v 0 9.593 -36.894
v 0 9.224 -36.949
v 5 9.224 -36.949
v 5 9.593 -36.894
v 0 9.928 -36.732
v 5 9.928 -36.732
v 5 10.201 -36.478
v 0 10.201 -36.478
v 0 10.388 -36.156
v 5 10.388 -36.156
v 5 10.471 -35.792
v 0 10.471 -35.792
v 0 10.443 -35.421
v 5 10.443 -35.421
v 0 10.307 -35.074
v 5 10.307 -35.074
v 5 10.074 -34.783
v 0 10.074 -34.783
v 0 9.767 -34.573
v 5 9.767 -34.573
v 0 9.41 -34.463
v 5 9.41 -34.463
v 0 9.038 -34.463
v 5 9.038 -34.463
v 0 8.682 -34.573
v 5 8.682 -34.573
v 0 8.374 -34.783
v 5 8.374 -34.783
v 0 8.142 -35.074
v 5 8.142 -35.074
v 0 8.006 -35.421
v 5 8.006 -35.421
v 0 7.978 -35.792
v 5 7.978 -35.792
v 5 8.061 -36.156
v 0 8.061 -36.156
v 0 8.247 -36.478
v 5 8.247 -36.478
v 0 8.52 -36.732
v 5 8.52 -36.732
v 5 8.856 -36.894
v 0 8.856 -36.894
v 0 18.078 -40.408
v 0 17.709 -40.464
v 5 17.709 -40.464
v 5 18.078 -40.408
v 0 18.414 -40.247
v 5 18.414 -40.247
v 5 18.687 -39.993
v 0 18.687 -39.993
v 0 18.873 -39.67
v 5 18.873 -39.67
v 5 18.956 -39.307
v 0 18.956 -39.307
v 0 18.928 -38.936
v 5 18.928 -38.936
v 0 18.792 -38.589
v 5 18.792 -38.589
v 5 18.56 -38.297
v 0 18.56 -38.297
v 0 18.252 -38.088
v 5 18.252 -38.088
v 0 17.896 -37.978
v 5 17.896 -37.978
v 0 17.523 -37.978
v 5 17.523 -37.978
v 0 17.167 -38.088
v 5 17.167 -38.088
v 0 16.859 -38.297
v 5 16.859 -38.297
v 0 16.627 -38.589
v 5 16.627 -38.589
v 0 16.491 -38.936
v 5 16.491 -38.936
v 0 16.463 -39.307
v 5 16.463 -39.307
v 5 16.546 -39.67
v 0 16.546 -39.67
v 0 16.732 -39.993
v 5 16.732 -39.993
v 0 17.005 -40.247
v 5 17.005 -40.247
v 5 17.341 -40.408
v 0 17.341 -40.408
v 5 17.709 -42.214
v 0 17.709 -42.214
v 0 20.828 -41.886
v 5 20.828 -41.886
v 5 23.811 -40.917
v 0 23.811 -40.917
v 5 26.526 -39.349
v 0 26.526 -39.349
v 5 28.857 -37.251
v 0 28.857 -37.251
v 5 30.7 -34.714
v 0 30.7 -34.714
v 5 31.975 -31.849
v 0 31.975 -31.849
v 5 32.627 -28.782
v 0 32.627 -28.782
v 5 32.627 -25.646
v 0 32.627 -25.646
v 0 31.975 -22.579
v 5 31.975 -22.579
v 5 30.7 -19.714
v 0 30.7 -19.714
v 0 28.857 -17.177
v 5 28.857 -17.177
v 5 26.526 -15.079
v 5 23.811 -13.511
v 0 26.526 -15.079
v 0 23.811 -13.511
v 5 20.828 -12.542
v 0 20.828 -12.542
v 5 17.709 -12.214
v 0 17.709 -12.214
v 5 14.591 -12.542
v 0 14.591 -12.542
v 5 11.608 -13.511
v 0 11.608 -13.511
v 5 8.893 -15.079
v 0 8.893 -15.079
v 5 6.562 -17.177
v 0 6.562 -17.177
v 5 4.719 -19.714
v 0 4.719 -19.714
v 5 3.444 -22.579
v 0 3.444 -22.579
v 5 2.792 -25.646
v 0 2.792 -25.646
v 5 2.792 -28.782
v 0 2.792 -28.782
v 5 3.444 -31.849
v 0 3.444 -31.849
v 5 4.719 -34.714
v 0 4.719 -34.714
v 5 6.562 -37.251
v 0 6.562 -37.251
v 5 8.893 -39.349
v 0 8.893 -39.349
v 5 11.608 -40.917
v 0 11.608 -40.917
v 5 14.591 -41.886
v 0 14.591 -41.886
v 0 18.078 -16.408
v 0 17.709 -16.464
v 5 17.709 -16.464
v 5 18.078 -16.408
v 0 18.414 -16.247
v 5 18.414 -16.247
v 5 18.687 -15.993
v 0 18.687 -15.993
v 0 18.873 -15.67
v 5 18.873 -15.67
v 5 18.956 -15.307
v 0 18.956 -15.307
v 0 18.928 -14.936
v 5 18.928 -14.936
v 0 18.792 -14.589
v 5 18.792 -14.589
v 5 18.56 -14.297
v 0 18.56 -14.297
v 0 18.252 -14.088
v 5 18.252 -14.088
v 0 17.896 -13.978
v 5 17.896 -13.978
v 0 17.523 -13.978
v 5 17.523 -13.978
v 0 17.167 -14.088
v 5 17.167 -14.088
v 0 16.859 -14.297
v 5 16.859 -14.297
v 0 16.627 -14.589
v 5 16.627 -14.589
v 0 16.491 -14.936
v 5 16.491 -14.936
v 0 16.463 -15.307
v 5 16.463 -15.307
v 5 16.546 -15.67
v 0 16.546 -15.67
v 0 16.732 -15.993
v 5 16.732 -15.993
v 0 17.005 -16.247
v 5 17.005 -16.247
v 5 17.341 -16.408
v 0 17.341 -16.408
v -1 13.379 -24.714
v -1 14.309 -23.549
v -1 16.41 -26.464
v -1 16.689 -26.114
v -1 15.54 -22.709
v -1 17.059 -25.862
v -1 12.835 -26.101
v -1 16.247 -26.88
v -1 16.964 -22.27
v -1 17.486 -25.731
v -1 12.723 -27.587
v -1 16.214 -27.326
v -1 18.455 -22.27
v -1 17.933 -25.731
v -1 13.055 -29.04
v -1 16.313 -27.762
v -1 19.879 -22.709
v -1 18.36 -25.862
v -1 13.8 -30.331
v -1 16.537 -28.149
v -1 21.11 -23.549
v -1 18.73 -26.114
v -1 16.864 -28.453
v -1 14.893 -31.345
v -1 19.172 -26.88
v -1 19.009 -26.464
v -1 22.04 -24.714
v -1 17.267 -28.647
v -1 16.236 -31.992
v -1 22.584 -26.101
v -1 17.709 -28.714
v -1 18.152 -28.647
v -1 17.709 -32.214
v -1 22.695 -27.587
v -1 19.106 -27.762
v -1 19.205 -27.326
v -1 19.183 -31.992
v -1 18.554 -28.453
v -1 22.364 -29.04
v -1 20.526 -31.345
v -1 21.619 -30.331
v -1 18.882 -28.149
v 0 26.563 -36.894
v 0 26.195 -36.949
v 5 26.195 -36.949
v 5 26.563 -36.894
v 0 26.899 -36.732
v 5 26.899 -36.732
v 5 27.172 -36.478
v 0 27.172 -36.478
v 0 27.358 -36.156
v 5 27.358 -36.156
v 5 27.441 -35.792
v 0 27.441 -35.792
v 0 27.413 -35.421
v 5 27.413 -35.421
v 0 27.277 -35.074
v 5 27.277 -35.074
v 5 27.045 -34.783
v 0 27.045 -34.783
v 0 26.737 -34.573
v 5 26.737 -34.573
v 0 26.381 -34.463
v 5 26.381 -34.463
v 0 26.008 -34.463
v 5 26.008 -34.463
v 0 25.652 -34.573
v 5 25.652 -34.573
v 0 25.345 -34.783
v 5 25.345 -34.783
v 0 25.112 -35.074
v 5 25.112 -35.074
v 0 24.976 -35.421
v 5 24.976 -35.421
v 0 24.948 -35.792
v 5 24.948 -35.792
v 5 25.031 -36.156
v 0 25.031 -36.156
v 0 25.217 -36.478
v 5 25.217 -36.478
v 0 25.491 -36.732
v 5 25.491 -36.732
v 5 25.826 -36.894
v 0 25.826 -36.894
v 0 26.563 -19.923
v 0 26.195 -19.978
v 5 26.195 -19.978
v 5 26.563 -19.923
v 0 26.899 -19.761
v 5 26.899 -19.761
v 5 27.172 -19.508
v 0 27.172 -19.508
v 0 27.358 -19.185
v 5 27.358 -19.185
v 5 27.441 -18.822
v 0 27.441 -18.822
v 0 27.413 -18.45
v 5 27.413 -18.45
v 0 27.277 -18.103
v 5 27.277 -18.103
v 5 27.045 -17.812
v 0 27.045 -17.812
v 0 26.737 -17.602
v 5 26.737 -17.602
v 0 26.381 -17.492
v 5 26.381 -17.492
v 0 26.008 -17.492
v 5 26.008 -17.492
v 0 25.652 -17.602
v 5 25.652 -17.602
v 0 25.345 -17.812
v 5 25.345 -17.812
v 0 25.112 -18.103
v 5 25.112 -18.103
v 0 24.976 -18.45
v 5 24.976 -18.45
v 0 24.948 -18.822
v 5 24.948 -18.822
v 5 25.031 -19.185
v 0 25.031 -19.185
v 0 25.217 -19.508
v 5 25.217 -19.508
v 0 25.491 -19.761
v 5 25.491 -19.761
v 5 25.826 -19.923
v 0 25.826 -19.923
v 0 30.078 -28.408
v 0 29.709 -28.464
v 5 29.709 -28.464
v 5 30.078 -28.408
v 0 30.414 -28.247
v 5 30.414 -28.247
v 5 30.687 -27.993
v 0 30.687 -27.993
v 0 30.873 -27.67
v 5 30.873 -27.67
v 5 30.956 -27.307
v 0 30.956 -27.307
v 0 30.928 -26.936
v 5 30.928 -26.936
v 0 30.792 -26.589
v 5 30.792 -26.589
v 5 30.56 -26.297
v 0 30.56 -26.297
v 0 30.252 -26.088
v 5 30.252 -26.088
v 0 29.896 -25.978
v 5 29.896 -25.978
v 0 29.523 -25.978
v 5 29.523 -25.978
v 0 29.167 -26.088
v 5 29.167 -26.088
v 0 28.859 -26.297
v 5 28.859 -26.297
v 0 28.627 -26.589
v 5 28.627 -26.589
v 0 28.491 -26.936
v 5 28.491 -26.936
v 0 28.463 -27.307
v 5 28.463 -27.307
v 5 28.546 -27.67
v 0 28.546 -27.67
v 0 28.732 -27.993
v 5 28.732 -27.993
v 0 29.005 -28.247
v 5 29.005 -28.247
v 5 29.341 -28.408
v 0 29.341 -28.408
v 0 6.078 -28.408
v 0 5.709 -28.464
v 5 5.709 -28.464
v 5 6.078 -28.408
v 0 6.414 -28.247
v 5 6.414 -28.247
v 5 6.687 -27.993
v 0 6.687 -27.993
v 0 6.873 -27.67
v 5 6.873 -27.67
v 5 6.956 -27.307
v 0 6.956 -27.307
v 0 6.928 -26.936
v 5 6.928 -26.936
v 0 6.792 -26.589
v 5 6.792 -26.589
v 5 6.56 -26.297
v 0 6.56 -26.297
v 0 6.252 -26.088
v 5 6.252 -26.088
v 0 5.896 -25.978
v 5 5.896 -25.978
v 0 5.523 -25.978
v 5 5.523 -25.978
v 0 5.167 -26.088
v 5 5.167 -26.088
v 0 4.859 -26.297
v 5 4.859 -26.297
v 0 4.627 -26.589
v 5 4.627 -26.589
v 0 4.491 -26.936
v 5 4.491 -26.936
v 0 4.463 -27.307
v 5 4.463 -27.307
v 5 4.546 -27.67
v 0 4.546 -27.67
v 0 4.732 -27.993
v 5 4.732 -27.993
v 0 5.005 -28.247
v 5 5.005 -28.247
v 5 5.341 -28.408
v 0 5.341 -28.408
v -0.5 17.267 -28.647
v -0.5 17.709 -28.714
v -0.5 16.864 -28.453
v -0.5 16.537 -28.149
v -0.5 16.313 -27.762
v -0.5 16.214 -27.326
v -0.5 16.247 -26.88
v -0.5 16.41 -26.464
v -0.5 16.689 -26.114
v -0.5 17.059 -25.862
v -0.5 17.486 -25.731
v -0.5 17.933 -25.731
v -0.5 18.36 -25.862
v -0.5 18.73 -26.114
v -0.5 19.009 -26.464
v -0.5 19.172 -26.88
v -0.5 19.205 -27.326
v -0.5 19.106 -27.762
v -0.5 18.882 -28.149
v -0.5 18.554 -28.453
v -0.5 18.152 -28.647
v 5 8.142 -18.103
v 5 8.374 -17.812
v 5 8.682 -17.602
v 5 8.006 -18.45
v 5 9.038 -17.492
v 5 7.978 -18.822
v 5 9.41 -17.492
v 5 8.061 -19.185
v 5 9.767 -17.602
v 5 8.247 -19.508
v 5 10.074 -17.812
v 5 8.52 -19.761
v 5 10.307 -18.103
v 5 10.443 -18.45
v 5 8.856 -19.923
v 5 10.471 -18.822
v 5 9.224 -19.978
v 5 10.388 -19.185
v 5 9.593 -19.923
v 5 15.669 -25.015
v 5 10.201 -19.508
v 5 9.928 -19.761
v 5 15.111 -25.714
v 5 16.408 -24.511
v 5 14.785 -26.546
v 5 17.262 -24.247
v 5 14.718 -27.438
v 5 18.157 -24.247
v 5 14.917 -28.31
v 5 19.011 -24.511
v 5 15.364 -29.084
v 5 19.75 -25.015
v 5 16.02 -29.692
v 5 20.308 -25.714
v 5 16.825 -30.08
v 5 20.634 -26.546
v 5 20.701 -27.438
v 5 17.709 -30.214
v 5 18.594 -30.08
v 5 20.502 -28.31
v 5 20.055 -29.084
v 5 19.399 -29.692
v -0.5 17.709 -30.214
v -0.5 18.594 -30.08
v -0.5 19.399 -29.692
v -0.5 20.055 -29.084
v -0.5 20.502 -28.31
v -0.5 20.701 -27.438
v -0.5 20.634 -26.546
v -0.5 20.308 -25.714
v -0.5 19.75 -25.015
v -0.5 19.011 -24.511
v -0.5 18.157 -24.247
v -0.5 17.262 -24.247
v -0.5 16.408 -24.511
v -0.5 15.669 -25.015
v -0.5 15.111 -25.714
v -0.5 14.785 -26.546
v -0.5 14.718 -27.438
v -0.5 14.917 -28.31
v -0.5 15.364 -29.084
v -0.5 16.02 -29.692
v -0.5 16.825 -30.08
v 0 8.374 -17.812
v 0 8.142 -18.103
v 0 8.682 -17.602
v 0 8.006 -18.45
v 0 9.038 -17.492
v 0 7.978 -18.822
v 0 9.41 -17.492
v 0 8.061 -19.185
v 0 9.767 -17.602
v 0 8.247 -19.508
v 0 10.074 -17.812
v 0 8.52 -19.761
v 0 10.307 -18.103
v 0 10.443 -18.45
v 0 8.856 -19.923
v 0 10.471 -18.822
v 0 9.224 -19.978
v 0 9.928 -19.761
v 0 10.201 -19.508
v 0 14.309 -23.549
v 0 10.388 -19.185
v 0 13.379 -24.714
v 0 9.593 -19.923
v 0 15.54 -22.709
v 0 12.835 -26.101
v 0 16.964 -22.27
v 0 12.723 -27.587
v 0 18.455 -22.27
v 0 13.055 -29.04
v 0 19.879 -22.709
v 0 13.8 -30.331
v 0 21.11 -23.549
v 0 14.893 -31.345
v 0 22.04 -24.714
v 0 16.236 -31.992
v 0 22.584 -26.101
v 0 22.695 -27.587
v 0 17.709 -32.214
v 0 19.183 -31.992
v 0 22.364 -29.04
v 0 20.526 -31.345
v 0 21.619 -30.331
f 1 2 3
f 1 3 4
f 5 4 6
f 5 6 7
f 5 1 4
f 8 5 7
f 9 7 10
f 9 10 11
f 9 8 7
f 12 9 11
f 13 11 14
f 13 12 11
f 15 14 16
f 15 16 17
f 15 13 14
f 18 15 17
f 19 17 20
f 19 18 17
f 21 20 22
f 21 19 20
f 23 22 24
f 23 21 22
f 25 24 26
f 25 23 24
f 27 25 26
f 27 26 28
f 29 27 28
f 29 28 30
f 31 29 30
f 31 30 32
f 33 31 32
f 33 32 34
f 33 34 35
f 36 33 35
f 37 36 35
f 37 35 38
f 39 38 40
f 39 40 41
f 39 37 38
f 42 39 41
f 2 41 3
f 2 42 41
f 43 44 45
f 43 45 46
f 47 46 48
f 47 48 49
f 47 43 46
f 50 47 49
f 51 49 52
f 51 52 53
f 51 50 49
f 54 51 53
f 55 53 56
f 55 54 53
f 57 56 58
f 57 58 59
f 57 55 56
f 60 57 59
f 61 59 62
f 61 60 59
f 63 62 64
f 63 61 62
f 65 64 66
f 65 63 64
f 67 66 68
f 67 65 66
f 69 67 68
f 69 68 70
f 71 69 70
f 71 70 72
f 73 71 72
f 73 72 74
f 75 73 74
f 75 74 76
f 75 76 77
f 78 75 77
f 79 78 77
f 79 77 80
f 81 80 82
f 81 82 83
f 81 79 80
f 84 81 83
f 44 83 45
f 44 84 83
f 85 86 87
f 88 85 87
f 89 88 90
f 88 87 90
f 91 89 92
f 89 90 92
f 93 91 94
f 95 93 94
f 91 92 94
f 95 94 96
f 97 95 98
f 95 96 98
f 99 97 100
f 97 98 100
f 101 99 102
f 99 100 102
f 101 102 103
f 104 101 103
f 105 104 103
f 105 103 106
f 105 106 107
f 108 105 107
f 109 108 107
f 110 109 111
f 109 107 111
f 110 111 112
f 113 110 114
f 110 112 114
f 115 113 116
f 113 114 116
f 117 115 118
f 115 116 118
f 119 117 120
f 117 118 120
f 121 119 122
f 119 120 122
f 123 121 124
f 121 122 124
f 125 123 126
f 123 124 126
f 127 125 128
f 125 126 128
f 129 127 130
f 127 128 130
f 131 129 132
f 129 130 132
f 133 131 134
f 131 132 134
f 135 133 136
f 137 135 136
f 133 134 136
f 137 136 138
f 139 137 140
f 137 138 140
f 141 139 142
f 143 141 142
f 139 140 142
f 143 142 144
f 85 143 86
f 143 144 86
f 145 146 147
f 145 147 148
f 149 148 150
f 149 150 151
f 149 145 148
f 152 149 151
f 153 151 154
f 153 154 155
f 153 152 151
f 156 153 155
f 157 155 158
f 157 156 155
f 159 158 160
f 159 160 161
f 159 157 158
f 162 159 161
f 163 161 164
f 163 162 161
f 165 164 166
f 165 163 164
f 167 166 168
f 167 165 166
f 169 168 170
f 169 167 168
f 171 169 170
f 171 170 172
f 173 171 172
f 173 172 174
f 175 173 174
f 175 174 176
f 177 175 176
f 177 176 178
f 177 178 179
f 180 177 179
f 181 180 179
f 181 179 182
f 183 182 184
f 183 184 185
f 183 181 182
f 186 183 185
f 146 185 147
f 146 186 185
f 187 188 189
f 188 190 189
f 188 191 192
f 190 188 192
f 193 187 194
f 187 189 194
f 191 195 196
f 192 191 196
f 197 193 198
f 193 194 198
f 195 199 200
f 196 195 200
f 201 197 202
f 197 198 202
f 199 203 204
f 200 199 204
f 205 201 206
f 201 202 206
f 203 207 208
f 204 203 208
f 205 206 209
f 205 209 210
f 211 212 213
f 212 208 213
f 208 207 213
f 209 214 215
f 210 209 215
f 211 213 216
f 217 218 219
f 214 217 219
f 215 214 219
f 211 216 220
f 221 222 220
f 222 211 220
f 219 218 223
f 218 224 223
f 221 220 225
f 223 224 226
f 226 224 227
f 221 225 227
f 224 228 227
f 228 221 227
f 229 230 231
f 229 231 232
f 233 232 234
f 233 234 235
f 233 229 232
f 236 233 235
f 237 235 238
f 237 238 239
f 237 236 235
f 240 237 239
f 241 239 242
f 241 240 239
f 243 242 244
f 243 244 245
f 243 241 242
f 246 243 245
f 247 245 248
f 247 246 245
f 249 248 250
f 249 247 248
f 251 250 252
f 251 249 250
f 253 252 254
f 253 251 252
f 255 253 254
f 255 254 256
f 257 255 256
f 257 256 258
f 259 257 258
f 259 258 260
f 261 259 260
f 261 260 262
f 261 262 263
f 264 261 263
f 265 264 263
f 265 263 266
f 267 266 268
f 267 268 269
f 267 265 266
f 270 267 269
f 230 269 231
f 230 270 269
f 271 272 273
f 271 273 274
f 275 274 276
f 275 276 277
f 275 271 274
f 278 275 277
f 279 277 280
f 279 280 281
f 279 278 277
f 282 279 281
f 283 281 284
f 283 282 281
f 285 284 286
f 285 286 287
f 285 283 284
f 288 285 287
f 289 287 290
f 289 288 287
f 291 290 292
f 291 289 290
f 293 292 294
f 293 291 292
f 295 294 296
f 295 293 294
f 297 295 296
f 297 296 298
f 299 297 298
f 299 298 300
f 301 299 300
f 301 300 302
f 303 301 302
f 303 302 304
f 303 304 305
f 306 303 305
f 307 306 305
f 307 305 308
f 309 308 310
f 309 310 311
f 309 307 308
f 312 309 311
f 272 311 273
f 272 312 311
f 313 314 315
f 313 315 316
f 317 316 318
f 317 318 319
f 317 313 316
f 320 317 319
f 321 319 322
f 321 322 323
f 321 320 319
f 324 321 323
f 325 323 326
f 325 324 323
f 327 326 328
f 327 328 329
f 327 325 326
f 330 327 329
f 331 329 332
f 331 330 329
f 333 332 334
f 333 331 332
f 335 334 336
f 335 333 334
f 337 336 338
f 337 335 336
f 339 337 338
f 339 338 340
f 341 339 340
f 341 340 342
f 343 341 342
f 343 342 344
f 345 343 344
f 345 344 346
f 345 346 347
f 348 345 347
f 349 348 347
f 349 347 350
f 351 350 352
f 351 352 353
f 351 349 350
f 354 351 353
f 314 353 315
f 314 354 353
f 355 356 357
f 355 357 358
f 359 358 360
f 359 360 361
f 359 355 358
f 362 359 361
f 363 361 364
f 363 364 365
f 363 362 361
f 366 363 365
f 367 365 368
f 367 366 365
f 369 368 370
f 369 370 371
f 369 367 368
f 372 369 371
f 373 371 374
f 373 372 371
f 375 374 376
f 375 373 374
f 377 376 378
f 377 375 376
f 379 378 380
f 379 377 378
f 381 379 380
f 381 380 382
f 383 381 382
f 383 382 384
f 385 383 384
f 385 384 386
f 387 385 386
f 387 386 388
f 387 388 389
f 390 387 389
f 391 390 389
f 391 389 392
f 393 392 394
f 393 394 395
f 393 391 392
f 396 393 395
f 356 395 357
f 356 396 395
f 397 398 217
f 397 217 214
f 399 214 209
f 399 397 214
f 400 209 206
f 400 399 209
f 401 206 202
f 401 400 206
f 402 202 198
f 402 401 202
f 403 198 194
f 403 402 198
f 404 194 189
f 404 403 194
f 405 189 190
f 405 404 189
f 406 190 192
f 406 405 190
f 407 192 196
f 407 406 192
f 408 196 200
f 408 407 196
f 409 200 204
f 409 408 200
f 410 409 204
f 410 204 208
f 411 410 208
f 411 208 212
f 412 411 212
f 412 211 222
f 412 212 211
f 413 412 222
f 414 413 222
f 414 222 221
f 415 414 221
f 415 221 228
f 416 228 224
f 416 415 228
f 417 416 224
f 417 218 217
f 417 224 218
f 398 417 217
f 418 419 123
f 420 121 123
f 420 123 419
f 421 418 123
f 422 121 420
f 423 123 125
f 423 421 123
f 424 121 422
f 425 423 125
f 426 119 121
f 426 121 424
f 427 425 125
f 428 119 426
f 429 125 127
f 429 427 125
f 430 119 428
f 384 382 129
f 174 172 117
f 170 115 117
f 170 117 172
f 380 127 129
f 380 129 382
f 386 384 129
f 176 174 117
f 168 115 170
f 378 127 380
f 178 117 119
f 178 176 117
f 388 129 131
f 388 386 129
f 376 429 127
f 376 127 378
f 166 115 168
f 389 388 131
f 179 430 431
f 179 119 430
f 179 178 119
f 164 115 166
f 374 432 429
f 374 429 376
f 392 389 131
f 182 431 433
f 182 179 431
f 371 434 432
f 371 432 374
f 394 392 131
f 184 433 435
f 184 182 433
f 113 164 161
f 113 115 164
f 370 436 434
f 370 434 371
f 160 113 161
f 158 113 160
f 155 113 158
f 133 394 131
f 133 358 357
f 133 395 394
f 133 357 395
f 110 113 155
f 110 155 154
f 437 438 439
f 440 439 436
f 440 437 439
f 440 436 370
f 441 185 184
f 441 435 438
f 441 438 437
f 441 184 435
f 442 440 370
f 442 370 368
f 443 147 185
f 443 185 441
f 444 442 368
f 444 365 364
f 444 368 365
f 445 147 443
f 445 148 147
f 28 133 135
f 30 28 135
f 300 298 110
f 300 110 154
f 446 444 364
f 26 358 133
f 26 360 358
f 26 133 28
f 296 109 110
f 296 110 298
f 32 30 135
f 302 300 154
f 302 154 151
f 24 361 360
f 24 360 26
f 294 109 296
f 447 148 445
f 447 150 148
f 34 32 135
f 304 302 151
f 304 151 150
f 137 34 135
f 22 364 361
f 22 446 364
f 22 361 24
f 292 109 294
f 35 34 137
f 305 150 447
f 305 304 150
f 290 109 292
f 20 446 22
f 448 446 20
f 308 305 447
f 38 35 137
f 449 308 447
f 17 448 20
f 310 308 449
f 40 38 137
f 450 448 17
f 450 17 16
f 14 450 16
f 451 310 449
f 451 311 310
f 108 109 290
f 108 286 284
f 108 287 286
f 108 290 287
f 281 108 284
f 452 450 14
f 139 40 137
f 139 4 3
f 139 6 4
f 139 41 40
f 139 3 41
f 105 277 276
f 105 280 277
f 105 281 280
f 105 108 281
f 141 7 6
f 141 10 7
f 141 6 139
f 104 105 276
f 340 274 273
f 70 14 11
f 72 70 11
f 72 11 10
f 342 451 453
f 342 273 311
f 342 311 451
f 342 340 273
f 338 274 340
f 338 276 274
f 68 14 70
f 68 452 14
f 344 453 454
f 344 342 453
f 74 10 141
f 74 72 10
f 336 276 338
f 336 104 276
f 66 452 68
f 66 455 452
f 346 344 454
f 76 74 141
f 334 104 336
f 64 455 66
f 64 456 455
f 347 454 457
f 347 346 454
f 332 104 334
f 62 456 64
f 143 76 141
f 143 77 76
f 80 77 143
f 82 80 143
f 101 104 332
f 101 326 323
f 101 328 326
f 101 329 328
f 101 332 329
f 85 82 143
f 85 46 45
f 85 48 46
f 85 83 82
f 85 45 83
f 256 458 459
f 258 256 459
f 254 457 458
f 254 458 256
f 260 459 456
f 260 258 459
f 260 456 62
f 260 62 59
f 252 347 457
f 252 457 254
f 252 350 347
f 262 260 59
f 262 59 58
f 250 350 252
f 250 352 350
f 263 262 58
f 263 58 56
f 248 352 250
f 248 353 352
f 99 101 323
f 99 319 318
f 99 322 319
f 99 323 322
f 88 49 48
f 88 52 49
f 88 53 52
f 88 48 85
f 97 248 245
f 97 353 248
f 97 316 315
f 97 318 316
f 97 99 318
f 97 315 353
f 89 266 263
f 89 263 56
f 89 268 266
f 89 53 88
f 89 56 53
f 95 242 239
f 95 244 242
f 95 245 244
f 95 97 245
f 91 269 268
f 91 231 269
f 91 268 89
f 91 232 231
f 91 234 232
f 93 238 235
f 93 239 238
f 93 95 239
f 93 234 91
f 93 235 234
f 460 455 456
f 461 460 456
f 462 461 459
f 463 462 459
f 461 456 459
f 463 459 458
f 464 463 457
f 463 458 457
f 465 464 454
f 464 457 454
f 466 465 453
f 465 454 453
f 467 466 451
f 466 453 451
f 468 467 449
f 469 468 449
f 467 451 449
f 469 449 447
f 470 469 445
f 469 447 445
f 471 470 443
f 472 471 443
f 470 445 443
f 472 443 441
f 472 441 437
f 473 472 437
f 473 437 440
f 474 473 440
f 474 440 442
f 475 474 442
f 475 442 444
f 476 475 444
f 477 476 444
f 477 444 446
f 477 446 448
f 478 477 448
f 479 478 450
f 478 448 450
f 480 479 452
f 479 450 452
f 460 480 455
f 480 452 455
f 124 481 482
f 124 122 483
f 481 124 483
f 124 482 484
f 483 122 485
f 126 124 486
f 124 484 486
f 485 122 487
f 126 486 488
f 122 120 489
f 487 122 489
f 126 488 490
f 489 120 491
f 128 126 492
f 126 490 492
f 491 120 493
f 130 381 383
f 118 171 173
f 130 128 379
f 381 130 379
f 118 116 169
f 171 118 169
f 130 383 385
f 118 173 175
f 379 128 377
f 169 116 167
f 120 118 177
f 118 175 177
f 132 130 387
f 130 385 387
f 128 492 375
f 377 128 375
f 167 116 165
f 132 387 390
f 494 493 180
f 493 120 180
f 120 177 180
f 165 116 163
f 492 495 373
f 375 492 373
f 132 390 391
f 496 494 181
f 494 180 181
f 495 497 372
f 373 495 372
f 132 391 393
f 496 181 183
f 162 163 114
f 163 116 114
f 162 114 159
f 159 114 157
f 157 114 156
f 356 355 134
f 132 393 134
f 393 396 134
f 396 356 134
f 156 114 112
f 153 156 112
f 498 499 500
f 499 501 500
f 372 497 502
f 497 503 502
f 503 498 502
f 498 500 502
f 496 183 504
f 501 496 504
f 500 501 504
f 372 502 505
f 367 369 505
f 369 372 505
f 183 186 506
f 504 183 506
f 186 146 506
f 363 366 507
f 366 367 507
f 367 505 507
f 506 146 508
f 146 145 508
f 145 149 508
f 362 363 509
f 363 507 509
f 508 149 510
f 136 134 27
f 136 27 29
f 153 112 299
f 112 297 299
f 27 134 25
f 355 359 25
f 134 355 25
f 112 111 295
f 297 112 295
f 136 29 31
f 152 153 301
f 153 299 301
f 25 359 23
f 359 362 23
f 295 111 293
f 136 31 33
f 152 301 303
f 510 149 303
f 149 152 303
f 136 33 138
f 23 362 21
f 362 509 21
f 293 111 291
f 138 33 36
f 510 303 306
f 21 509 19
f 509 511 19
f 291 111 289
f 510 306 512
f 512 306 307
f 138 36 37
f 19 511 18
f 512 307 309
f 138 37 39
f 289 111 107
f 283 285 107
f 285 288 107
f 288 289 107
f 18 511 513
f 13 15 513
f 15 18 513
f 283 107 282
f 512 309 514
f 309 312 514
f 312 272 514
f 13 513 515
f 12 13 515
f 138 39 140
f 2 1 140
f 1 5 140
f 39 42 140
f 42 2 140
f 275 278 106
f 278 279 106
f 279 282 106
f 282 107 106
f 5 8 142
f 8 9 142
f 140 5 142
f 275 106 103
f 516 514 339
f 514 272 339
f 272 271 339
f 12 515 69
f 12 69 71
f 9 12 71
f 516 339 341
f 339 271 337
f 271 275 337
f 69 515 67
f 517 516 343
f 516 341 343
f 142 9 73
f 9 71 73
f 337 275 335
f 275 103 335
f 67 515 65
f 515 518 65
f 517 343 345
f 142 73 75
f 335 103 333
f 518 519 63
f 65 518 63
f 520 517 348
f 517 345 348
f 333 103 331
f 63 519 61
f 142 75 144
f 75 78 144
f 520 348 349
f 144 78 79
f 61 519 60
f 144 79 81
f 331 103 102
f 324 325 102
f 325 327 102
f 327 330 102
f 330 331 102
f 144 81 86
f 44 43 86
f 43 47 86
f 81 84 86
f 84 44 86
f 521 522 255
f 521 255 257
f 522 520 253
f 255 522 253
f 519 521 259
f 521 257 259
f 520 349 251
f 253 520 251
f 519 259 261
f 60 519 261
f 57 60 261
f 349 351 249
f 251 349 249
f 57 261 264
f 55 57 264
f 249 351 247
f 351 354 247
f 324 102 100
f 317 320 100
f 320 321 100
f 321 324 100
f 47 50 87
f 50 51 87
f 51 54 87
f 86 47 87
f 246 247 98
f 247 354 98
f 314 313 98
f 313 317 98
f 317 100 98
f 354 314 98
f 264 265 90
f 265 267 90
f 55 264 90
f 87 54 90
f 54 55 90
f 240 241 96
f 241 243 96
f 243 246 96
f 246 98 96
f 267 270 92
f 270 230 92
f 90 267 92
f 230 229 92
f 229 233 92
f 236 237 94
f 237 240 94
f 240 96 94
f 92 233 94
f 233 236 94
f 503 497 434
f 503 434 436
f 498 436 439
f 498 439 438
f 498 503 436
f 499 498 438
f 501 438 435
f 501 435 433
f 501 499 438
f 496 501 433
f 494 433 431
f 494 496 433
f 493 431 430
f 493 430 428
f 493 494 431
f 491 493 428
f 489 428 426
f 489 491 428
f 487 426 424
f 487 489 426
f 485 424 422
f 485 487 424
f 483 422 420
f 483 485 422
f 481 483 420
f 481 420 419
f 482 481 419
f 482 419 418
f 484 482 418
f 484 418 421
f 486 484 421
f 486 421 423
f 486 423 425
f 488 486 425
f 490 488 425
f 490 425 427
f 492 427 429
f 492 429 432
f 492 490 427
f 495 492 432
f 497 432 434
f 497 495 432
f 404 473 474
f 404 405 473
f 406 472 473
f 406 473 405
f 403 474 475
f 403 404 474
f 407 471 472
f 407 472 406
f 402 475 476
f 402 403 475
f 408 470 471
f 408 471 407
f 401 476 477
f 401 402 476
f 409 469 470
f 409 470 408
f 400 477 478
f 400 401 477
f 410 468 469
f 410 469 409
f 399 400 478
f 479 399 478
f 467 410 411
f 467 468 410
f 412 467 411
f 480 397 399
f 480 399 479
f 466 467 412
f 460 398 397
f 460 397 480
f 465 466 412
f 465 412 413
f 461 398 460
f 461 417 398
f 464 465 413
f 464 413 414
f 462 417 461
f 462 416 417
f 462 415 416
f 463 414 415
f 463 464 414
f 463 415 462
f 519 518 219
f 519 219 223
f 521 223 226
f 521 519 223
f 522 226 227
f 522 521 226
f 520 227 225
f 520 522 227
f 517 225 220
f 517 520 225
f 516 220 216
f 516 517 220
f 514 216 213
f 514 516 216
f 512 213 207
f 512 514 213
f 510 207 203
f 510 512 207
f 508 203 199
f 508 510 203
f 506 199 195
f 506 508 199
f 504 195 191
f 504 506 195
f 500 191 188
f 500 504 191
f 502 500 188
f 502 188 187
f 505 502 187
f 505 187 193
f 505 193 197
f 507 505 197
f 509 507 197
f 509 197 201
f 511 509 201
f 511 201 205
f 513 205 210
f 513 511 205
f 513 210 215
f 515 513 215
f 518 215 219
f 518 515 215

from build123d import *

# Parameters (mm, degrees)
SKETCH_1_R               = 15
SKETCH_1_R_2             = 1.25
EXTRUDE_2_DEPTH          = 5
SKETCH_3_R               = 5
EXTRUDE_4_DEPTH          = 1
SKETCH_4_R               = 3
CUT_EXTRUDE_1_DEPTH      = 5.5
CUT_EXTRUDE_2_DEPTH      = 78
CUT_EXTRUDE_2_DEPTH_BACK = 5.5
SKETCH_5_R               = 1.5


with BuildPart() as part:
    # ｽｹｯﾁ1 → ﾎﾞｽ - 押し出し2 (new body)
    with BuildSketch(Plane(origin=(0, 0, 0), x_dir=(0, 0, -1), z_dir=(1, 0, 0))):
        with Locations((27.213776389, 17.709467549)):
            Circle(SKETCH_1_R)
        with Locations((27.213776389, 29.709467549)):
            Circle(SKETCH_1_R_2, mode=Mode.SUBTRACT)
        with Locations((35.699057763, 26.194748924)):
            Circle(SKETCH_1_R_2, mode=Mode.SUBTRACT)
        with Locations((18.728495014, 26.194748924)):
            Circle(SKETCH_1_R_2, mode=Mode.SUBTRACT)
        with Locations((15.213776389, 17.709467549)):
            Circle(SKETCH_1_R_2, mode=Mode.SUBTRACT)
        with Locations((35.699057763, 9.224186175)):
            Circle(SKETCH_1_R_2, mode=Mode.SUBTRACT)
        with Locations((39.213776389, 17.709467549)):
            Circle(SKETCH_1_R_2, mode=Mode.SUBTRACT)
        with Locations((18.728495014, 9.224186175)):
            Circle(SKETCH_1_R_2, mode=Mode.SUBTRACT)
        with Locations((27.213776389, 5.709467549)):
            Circle(SKETCH_1_R_2, mode=Mode.SUBTRACT)
    extrude(amount=EXTRUDE_2_DEPTH)

    # ｽｹｯﾁ3 → ﾎﾞｽ - 押し出し4 (add)
    with BuildSketch(Plane(origin=(0, 0, 0), x_dir=(0, 0, -1), z_dir=(1, 0, 0))):
        with Locations((27.213776389, 17.709467549)):
            Circle(SKETCH_3_R)
    extrude(amount=-EXTRUDE_4_DEPTH)

    # ｽｹｯﾁ4 → ｶｯﾄ - 押し出し1 (cut)
    with BuildSketch(Plane(origin=(5, 0, 0), x_dir=(0, 0, -1), z_dir=(1, 0, 0))):
        with Locations((27.213776389, 17.709467549)):
            Circle(SKETCH_4_R)
    extrude(amount=-CUT_EXTRUDE_1_DEPTH, mode=Mode.SUBTRACT)

    # ｽｹｯﾁ5 → ｶｯﾄ - 押し出し2 (cut, two sides: drawn at the far end of the back side and taken through both)
    with BuildSketch(Plane.ZY.offset(-CUT_EXTRUDE_2_DEPTH_BACK)):
        with Locations(Location((-27.213776389, 17.709467549, 0), (0, 0, 180))):
            Circle(SKETCH_5_R)
    extrude(amount=CUT_EXTRUDE_2_DEPTH + CUT_EXTRUDE_2_DEPTH_BACK, mode=Mode.SUBTRACT)


solid = part.part
